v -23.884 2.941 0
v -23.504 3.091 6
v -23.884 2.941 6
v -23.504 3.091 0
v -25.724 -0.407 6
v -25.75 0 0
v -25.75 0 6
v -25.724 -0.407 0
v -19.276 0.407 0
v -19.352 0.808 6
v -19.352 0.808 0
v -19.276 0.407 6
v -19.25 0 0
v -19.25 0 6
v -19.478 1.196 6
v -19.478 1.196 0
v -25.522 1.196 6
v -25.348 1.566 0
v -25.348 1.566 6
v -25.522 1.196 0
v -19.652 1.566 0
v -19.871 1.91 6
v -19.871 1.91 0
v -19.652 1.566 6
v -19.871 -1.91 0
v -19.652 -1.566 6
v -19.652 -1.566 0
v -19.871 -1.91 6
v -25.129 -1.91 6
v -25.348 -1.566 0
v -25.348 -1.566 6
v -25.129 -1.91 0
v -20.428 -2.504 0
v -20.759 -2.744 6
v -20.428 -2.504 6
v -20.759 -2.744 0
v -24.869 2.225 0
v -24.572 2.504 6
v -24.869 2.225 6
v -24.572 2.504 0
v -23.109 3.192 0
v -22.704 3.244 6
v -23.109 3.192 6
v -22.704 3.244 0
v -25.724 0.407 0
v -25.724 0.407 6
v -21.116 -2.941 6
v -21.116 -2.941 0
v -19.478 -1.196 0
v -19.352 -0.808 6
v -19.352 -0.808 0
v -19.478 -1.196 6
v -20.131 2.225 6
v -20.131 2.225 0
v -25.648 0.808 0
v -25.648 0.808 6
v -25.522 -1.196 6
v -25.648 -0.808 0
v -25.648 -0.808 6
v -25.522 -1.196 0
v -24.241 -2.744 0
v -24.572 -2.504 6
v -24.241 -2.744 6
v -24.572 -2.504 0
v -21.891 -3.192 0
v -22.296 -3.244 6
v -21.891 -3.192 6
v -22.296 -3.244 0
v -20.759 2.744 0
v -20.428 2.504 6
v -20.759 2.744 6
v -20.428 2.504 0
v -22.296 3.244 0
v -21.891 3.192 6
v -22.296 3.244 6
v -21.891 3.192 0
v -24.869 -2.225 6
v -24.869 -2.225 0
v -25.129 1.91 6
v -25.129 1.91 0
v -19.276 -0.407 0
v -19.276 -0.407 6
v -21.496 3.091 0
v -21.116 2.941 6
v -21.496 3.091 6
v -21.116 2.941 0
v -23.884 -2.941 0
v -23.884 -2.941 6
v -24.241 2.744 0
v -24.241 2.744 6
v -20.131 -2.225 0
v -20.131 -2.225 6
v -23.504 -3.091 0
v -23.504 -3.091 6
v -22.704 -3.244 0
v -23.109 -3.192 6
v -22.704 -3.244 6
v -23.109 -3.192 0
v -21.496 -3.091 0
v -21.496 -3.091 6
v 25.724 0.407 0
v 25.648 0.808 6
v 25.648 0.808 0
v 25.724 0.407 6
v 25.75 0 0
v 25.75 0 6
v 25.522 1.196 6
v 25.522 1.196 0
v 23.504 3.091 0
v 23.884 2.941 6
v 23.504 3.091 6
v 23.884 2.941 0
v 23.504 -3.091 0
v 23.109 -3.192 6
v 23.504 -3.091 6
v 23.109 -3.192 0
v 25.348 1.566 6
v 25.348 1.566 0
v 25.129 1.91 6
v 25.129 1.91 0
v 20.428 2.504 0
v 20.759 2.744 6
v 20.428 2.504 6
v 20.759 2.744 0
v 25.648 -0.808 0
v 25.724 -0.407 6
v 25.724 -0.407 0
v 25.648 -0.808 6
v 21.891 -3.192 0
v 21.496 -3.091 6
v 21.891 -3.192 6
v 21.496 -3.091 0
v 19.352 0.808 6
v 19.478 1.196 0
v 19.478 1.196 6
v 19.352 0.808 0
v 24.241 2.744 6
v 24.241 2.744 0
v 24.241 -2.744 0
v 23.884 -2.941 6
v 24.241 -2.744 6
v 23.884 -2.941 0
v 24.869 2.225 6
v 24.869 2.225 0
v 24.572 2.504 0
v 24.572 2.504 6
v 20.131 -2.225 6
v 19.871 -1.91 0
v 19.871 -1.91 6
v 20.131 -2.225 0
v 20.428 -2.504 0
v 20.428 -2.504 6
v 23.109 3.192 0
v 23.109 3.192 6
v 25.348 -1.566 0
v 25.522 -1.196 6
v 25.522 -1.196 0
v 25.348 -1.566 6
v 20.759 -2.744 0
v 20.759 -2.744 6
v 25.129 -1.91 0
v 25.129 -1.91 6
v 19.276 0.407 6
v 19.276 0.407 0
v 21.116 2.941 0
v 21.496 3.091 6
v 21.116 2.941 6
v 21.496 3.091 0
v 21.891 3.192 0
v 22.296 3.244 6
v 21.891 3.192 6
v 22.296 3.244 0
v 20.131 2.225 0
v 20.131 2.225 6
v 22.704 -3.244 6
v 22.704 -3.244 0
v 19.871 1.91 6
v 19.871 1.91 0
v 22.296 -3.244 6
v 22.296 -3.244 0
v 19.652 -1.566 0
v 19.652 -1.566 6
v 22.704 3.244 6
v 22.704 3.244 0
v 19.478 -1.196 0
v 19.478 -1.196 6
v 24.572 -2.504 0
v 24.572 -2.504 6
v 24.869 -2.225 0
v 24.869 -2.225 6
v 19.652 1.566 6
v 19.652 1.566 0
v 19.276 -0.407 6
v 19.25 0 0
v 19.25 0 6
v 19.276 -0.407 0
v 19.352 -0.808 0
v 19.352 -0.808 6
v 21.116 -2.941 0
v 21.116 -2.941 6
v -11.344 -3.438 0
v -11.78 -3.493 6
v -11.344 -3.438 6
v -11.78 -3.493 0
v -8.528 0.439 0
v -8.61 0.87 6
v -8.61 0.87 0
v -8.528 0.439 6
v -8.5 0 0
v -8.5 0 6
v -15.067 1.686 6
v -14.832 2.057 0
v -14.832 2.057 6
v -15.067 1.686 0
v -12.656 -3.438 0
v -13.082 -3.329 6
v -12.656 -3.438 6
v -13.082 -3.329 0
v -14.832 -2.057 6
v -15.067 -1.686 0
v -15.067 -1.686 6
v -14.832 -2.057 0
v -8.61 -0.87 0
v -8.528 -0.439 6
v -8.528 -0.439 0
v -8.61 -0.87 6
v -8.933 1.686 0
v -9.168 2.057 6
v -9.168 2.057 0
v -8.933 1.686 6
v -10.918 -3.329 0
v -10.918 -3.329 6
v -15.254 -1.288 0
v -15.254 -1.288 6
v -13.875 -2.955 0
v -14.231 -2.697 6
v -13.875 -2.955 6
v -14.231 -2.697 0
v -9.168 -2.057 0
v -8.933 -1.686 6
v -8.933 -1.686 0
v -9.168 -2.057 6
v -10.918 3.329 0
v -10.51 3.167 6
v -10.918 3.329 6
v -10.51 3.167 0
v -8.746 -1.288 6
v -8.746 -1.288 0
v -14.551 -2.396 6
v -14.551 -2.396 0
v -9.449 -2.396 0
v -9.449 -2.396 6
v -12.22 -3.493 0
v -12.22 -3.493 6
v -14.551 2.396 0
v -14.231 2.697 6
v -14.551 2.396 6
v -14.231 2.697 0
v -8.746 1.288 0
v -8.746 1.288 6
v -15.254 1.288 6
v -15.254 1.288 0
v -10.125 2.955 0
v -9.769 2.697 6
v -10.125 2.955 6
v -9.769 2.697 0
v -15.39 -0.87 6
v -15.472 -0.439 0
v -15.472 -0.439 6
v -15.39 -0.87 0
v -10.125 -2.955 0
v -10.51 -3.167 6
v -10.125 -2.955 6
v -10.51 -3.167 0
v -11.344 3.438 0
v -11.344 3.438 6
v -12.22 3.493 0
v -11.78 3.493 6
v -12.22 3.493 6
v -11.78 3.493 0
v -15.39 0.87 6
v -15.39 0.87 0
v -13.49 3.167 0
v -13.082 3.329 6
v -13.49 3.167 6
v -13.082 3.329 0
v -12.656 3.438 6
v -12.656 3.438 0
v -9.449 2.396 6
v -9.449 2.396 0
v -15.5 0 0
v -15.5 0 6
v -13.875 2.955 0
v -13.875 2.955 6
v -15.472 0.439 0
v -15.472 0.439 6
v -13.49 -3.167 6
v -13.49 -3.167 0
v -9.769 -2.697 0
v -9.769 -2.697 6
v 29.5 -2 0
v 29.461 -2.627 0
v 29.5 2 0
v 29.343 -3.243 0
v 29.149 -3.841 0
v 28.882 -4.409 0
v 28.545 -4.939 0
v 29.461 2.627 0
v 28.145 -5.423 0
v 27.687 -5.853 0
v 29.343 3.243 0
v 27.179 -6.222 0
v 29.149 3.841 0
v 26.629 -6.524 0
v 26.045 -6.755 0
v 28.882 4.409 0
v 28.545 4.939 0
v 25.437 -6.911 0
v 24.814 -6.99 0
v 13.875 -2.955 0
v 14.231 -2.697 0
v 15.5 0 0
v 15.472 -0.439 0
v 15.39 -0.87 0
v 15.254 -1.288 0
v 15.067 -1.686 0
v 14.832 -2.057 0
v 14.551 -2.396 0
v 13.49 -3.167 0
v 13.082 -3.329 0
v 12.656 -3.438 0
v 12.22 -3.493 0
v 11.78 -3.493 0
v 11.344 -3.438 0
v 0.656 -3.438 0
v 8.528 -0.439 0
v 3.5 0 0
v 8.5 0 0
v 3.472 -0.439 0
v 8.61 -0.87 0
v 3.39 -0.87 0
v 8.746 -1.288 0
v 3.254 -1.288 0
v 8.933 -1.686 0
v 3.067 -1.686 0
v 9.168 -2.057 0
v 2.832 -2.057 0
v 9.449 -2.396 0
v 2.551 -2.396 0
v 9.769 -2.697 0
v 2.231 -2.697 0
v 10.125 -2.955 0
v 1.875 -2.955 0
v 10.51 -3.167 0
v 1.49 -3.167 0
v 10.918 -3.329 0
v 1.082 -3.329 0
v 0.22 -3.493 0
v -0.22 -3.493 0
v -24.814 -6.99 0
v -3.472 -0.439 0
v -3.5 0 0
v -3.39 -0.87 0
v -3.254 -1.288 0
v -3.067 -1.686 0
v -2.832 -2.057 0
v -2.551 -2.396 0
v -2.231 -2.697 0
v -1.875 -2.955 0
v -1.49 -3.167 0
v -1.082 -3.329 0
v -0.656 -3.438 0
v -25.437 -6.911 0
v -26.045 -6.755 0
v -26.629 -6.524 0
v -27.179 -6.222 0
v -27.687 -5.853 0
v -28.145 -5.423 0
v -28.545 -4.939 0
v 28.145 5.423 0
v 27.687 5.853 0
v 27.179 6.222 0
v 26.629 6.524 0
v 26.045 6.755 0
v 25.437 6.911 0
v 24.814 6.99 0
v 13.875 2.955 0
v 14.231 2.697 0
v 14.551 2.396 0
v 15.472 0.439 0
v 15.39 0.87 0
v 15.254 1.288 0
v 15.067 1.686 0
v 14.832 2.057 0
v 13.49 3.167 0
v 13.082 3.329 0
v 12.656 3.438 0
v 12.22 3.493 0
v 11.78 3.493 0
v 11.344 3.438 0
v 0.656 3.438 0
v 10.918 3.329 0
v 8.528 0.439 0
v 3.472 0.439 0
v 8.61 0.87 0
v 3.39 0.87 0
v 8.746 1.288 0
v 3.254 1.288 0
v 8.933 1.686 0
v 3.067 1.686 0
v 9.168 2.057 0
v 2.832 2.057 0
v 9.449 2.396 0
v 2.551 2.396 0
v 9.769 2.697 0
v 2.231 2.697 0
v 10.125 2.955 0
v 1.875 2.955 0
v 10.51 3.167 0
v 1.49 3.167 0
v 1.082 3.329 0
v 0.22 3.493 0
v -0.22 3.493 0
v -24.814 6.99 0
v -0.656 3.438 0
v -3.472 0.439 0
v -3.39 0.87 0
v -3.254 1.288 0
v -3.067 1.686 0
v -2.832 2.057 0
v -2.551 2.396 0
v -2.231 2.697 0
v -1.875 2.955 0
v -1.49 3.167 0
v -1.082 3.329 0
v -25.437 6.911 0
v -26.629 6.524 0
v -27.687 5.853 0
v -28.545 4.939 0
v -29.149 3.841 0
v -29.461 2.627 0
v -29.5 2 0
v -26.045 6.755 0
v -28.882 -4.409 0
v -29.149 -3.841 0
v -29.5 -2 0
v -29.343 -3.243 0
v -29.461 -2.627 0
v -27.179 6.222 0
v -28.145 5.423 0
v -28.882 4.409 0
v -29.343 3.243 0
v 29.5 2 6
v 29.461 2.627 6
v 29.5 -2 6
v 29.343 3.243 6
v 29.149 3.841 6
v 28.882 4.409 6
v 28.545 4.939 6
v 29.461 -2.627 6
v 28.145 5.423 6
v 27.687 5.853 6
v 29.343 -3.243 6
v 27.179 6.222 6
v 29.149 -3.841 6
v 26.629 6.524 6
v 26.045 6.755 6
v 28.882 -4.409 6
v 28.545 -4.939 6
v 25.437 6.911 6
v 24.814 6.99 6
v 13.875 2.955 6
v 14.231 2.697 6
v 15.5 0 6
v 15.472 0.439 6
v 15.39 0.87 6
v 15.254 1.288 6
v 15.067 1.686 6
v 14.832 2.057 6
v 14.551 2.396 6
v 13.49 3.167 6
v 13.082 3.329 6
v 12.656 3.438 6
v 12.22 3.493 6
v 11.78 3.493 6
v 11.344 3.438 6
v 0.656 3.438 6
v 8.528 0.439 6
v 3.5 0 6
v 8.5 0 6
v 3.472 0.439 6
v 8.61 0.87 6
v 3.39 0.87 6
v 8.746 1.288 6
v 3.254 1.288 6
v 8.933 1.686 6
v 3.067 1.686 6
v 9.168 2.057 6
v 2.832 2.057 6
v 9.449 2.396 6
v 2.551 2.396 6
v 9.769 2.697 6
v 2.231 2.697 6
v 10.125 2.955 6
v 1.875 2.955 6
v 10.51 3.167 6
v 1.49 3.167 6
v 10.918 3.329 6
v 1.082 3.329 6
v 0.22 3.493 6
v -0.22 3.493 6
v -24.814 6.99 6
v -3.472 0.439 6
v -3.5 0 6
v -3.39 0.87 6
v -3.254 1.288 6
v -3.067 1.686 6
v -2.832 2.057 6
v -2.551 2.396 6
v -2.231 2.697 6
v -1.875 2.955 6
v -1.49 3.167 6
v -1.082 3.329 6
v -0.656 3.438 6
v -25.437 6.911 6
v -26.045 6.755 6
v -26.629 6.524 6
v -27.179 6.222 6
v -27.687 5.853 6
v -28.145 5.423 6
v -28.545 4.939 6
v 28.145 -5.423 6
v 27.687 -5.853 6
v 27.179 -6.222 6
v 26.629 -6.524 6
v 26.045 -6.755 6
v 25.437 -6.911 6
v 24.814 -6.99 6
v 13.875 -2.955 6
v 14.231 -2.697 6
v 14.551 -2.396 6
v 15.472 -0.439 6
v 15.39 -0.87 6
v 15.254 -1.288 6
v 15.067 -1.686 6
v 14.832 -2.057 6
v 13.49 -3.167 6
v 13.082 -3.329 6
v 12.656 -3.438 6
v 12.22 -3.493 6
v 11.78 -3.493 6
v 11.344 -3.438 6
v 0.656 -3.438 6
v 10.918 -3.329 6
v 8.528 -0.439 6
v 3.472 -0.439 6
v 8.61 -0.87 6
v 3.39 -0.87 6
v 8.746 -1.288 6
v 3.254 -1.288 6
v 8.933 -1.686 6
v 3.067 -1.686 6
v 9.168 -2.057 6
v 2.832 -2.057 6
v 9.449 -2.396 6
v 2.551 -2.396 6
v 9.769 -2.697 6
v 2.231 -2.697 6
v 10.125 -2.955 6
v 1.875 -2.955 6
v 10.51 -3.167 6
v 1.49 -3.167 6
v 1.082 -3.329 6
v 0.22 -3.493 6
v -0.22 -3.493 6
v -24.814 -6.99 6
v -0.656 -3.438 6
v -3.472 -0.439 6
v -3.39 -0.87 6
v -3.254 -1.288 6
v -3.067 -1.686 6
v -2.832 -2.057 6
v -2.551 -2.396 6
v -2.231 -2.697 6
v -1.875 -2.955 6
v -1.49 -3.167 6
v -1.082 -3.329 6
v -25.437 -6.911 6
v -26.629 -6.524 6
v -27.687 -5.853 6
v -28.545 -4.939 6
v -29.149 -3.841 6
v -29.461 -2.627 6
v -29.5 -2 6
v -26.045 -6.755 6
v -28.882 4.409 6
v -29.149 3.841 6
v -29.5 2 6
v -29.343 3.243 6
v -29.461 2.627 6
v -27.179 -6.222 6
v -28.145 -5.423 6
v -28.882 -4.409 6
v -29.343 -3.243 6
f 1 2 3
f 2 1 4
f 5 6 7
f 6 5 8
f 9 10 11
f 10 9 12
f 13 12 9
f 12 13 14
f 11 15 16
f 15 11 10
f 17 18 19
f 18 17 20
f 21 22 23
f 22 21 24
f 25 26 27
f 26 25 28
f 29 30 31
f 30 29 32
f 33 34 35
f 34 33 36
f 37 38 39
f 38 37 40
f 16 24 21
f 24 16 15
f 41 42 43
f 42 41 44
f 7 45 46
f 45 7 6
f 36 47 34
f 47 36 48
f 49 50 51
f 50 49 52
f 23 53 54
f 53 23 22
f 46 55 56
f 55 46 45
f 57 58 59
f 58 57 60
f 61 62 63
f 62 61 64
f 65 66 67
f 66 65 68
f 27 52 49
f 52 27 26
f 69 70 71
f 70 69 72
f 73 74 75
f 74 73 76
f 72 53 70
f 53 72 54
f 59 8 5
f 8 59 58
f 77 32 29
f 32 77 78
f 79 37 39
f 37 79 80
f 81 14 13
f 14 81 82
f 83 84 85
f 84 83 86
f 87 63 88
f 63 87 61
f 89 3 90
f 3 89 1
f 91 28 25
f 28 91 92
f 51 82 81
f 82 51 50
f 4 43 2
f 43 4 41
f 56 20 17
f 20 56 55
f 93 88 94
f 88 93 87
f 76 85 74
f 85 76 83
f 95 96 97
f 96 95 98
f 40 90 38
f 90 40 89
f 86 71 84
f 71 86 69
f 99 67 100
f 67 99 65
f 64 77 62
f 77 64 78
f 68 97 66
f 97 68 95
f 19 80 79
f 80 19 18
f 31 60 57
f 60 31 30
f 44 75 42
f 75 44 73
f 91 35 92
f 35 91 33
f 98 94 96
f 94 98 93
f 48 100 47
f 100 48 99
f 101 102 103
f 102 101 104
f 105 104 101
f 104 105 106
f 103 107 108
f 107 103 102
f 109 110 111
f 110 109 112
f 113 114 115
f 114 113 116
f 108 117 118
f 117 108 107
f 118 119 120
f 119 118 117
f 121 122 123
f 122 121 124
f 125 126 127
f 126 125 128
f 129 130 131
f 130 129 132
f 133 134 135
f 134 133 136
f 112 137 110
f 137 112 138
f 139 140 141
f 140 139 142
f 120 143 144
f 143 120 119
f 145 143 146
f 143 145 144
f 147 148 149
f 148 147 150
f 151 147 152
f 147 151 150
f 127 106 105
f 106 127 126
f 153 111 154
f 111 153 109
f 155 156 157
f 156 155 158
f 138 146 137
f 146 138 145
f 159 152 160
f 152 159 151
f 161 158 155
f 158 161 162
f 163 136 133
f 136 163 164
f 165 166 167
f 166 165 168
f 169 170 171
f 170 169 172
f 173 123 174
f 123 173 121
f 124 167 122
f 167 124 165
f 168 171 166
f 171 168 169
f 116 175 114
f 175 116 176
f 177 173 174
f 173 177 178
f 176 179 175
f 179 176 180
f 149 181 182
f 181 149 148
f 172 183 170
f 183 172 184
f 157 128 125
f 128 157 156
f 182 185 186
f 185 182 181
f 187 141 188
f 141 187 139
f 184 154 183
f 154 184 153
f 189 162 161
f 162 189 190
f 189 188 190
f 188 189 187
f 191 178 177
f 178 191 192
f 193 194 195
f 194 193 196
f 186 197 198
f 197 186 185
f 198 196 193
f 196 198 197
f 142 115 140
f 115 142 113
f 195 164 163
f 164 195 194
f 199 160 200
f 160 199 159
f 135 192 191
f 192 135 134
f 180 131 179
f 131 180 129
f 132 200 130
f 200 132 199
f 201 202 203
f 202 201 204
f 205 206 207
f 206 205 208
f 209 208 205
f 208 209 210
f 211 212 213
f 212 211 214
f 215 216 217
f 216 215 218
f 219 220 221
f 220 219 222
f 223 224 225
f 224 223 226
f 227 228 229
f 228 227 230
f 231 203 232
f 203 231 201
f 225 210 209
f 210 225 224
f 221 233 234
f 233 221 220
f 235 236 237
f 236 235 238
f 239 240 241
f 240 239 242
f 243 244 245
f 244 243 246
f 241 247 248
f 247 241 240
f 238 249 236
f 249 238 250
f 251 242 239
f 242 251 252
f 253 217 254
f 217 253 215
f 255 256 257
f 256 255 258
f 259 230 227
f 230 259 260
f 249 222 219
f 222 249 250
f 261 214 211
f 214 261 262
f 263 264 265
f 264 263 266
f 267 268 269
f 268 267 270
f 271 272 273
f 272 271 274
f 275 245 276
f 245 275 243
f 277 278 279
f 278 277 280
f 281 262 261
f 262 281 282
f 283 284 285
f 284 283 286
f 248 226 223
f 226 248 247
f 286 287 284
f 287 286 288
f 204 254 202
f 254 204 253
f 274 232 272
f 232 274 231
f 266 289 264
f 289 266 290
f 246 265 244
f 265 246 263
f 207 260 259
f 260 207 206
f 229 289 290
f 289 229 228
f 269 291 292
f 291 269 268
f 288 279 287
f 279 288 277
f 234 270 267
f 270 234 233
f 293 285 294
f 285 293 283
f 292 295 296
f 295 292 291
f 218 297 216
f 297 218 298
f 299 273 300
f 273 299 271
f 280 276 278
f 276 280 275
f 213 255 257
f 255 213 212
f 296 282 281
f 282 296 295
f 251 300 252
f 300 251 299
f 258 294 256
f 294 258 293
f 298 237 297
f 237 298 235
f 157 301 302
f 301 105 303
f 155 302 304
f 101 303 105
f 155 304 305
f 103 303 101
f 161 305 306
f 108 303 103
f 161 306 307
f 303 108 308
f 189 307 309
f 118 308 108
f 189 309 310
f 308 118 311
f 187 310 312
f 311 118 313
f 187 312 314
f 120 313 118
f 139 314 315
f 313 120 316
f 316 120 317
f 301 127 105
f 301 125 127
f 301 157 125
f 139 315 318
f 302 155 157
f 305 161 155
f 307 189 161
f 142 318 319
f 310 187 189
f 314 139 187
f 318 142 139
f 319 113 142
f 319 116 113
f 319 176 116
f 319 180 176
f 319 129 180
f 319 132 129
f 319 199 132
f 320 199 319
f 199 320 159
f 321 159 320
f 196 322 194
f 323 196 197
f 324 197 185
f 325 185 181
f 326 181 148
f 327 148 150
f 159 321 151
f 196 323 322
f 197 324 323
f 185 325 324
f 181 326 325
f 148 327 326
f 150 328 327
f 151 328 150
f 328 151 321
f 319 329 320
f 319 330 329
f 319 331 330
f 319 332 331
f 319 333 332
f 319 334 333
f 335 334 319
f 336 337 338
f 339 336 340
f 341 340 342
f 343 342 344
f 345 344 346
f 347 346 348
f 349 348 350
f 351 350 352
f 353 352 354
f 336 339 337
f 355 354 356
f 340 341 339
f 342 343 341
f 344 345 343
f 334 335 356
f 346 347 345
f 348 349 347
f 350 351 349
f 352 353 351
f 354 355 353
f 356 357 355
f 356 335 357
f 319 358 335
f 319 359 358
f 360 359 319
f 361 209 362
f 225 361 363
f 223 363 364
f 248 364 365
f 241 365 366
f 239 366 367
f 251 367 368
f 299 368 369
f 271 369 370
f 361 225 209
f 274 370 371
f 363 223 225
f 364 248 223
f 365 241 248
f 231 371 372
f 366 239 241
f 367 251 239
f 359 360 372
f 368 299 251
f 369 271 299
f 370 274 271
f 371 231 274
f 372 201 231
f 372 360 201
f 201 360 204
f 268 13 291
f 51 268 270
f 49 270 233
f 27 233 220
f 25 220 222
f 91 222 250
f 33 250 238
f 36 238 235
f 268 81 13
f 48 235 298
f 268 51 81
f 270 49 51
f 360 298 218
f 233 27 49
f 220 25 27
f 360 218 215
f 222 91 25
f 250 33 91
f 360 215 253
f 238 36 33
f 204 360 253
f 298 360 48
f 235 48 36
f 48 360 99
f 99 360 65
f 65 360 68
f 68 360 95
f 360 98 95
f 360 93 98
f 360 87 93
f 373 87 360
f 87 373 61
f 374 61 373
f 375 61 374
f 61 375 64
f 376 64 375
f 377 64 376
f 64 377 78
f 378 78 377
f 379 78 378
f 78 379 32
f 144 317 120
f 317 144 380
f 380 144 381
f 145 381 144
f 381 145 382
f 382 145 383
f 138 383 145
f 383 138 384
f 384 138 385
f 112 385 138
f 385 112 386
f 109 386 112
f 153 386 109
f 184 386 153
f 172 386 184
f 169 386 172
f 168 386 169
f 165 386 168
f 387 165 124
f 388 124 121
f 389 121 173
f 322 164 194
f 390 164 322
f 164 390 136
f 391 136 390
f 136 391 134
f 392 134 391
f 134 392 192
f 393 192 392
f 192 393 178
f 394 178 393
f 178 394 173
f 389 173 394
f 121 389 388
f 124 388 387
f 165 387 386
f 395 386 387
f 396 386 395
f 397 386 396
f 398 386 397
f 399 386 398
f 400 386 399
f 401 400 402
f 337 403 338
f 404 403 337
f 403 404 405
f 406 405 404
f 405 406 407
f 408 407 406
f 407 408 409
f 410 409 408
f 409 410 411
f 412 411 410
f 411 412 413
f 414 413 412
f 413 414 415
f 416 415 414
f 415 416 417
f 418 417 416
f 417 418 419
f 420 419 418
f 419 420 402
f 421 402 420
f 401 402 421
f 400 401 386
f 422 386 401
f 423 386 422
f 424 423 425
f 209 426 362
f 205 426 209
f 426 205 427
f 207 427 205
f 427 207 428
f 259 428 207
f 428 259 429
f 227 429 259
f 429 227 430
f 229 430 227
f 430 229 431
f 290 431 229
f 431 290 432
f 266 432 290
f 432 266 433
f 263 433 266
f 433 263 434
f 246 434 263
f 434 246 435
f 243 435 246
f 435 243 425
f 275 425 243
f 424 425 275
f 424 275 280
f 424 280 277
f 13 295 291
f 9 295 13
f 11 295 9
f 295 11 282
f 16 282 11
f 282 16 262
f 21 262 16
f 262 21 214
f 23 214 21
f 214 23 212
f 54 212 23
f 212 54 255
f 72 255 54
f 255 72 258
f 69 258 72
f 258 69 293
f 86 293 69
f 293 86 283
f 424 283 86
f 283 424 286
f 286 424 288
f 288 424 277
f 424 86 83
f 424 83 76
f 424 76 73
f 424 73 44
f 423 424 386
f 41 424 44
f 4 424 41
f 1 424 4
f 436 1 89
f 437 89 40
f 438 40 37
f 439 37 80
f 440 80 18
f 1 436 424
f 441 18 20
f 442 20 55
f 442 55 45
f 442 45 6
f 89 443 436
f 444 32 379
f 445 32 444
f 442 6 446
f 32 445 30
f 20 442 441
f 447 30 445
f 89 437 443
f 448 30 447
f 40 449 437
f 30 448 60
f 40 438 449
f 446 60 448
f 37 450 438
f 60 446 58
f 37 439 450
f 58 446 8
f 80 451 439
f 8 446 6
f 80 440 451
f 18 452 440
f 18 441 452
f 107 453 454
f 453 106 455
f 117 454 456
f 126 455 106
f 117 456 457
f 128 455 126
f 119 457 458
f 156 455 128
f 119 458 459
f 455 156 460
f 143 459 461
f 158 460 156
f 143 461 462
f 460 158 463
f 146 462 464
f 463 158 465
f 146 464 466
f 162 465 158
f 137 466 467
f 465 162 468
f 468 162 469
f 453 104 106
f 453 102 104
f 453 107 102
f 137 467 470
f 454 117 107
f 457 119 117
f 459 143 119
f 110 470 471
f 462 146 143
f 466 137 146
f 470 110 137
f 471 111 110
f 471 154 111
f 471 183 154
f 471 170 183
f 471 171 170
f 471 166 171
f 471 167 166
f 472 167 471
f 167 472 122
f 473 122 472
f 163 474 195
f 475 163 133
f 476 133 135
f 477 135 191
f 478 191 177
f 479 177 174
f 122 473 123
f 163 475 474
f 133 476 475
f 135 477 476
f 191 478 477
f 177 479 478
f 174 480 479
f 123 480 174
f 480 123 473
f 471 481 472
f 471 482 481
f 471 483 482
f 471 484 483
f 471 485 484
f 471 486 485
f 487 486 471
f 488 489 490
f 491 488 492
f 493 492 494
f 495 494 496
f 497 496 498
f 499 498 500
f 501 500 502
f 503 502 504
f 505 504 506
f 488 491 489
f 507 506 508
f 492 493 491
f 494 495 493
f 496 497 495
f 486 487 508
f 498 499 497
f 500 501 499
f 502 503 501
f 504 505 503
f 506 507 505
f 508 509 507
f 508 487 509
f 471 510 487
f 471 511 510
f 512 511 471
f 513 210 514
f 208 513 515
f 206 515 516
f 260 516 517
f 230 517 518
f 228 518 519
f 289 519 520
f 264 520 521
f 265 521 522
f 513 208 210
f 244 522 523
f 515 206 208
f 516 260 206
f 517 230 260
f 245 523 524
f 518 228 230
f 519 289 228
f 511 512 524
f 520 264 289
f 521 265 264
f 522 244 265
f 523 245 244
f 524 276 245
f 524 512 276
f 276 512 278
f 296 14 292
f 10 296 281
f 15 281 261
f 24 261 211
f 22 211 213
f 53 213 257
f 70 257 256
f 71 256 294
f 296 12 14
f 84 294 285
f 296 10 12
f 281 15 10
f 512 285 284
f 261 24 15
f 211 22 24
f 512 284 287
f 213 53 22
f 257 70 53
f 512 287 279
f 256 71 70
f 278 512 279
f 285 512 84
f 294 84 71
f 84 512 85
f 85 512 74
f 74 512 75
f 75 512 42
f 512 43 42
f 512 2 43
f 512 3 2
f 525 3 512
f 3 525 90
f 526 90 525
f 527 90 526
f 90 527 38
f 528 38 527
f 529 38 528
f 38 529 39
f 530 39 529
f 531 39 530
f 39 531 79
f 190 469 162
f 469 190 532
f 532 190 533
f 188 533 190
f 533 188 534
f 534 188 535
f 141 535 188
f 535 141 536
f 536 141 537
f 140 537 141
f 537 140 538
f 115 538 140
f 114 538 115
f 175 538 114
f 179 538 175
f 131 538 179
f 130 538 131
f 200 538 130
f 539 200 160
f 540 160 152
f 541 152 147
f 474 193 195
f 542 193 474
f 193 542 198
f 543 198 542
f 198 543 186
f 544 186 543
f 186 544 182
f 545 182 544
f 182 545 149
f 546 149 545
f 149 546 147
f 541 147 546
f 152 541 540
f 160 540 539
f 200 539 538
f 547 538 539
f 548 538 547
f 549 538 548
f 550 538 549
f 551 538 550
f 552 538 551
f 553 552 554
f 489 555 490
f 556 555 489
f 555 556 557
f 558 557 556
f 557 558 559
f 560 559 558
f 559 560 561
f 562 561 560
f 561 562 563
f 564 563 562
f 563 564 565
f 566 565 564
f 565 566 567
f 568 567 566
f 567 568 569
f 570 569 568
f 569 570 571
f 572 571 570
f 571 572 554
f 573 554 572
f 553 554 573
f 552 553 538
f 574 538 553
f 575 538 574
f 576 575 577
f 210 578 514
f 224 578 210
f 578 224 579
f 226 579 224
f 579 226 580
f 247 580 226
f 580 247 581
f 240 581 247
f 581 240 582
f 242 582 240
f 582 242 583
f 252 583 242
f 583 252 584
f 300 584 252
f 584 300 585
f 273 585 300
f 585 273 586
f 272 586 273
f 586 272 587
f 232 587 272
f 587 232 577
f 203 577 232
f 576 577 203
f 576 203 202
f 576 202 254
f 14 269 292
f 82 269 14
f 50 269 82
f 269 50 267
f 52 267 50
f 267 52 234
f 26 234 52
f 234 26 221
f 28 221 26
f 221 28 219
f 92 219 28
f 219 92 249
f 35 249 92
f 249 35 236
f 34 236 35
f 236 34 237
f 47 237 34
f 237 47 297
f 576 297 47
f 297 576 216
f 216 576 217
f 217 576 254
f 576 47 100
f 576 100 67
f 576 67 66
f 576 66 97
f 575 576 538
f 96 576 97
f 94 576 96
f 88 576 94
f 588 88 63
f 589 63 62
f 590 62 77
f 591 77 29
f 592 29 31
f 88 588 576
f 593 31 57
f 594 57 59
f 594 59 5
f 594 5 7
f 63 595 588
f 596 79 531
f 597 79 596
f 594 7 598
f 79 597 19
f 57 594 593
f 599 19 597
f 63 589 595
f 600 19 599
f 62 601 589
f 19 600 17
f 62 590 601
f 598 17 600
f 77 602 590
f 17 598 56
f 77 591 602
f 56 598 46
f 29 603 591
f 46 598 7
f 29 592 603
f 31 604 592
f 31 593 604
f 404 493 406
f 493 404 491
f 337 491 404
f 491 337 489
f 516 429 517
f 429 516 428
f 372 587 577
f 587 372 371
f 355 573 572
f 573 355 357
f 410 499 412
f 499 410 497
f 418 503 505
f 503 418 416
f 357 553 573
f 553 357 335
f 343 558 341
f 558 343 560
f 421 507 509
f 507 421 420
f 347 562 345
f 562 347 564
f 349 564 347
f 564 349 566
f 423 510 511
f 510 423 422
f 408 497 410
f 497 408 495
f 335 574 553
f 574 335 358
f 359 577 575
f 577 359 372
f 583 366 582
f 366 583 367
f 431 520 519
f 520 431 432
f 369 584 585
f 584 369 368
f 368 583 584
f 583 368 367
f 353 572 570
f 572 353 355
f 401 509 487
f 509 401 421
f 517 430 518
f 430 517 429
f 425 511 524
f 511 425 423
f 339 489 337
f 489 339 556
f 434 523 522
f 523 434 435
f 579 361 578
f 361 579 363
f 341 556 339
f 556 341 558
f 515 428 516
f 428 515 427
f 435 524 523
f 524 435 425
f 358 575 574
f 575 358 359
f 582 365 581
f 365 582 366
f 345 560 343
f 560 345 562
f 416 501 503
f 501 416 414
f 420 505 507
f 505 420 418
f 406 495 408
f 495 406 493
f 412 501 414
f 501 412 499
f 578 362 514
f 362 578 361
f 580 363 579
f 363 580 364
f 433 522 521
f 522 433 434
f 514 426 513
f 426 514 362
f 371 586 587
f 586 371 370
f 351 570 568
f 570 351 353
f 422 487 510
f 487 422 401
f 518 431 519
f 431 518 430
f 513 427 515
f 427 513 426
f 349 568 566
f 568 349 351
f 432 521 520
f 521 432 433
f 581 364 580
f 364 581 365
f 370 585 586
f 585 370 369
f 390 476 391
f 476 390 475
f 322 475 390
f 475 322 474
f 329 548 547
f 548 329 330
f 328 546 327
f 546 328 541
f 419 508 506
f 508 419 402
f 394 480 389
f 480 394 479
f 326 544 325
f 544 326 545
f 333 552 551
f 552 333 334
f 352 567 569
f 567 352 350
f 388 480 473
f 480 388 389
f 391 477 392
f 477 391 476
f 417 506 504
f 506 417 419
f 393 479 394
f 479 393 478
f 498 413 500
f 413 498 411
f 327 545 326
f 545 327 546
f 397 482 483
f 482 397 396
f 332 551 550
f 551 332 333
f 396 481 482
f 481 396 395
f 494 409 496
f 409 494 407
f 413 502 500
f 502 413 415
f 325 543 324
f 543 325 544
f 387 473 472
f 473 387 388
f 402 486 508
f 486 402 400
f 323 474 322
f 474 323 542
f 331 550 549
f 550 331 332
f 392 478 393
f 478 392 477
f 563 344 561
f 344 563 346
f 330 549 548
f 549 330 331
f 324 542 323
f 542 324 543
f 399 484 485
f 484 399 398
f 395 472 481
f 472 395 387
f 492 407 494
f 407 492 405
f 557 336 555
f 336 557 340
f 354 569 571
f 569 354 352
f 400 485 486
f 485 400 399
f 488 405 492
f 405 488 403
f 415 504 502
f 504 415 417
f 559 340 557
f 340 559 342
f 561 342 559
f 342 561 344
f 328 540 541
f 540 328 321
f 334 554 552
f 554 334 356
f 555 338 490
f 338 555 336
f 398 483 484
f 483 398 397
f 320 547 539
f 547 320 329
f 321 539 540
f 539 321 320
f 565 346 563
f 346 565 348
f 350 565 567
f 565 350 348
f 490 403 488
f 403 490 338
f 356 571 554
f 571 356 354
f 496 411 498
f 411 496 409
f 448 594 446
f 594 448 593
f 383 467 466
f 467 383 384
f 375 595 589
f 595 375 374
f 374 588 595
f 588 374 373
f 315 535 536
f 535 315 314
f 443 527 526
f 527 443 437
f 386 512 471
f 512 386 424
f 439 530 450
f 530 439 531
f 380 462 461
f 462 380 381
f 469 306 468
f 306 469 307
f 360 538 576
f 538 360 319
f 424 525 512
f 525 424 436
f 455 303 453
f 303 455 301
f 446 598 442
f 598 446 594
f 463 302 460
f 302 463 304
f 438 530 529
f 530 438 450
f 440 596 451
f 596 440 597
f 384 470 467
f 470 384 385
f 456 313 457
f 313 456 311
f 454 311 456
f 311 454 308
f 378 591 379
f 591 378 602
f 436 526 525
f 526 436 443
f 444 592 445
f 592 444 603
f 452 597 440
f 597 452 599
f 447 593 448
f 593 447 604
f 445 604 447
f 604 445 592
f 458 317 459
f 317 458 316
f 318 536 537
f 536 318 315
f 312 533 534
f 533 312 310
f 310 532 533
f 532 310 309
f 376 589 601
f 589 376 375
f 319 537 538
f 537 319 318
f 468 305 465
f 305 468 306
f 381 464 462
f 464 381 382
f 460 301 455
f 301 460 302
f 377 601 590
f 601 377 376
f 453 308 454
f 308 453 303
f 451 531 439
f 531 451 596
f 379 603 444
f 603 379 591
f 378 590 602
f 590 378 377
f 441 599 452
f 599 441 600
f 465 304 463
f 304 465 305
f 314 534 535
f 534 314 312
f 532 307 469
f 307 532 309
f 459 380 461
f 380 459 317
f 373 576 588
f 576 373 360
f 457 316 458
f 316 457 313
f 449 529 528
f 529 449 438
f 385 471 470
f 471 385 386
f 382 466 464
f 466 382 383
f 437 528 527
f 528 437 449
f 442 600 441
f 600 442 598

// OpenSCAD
$fn = 50;


difference() {
	union() {
		hull() {
			translate(v = [-24.5000000000, 2.0000000000, 0]) {
				cylinder(h = 6, r = 5);
			}
			translate(v = [24.5000000000, 2.0000000000, 0]) {
				cylinder(h = 6, r = 5);
			}
			translate(v = [-24.5000000000, -2.0000000000, 0]) {
				cylinder(h = 6, r = 5);
			}
			translate(v = [24.5000000000, -2.0000000000, 0]) {
				cylinder(h = 6, r = 5);
			}
		}
	}
	union() {
		#translate(v = [-22.5000000000, 0.0000000000, 0]) {
			cylinder(h = 6, r = 3.2500000000);
		}
		#translate(v = [22.5000000000, 0.0000000000, 0]) {
			cylinder(h = 6, r = 3.2500000000);
		}
		#translate(v = [-22.5000000000, 0.0000000000, -100.0000000000]) {
			cylinder(h = 200, r = 3.2500000000);
		}
		#translate(v = [-22.5000000000, 0.0000000000, -100.0000000000]) {
			cylinder(h = 200, r = 3.2500000000);
		}
		#translate(v = [22.5000000000, 0.0000000000, -100.0000000000]) {
			cylinder(h = 200, r = 3.2500000000);
		}
		#translate(v = [22.5000000000, 0.0000000000, -100.0000000000]) {
			cylinder(h = 200, r = 3.2500000000);
		}
		#translate(v = [-22.5000000000, 0.0000000000, 0]) {
			cylinder(h = 6, r = 1.8000000000);
		}
		#translate(v = [22.5000000000, 0.0000000000, 0]) {
			cylinder(h = 6, r = 1.8000000000);
		}
		#translate(v = [-22.5000000000, 0.0000000000, 0]) {
			cylinder(h = 6, r = 1.8000000000);
		}
		#translate(v = [22.5000000000, 0.0000000000, 0]) {
			cylinder(h = 6, r = 1.8000000000);
		}
		#translate(v = [-22.5000000000, 0.0000000000, 0]) {
			cylinder(h = 6, r = 1.8000000000);
		}
		#translate(v = [22.5000000000, 0.0000000000, 0]) {
			cylinder(h = 6, r = 1.8000000000);
		}
		#translate(v = [-12.0000000000, 0, 0]) {
			cylinder(h = 6, r = 3.5000000000);
		}
		#cylinder(h = 6, r = 3.5000000000);
		#translate(v = [12.0000000000, 0, 0]) {
			cylinder(h = 6, r = 3.5000000000);
		}
	}
}
